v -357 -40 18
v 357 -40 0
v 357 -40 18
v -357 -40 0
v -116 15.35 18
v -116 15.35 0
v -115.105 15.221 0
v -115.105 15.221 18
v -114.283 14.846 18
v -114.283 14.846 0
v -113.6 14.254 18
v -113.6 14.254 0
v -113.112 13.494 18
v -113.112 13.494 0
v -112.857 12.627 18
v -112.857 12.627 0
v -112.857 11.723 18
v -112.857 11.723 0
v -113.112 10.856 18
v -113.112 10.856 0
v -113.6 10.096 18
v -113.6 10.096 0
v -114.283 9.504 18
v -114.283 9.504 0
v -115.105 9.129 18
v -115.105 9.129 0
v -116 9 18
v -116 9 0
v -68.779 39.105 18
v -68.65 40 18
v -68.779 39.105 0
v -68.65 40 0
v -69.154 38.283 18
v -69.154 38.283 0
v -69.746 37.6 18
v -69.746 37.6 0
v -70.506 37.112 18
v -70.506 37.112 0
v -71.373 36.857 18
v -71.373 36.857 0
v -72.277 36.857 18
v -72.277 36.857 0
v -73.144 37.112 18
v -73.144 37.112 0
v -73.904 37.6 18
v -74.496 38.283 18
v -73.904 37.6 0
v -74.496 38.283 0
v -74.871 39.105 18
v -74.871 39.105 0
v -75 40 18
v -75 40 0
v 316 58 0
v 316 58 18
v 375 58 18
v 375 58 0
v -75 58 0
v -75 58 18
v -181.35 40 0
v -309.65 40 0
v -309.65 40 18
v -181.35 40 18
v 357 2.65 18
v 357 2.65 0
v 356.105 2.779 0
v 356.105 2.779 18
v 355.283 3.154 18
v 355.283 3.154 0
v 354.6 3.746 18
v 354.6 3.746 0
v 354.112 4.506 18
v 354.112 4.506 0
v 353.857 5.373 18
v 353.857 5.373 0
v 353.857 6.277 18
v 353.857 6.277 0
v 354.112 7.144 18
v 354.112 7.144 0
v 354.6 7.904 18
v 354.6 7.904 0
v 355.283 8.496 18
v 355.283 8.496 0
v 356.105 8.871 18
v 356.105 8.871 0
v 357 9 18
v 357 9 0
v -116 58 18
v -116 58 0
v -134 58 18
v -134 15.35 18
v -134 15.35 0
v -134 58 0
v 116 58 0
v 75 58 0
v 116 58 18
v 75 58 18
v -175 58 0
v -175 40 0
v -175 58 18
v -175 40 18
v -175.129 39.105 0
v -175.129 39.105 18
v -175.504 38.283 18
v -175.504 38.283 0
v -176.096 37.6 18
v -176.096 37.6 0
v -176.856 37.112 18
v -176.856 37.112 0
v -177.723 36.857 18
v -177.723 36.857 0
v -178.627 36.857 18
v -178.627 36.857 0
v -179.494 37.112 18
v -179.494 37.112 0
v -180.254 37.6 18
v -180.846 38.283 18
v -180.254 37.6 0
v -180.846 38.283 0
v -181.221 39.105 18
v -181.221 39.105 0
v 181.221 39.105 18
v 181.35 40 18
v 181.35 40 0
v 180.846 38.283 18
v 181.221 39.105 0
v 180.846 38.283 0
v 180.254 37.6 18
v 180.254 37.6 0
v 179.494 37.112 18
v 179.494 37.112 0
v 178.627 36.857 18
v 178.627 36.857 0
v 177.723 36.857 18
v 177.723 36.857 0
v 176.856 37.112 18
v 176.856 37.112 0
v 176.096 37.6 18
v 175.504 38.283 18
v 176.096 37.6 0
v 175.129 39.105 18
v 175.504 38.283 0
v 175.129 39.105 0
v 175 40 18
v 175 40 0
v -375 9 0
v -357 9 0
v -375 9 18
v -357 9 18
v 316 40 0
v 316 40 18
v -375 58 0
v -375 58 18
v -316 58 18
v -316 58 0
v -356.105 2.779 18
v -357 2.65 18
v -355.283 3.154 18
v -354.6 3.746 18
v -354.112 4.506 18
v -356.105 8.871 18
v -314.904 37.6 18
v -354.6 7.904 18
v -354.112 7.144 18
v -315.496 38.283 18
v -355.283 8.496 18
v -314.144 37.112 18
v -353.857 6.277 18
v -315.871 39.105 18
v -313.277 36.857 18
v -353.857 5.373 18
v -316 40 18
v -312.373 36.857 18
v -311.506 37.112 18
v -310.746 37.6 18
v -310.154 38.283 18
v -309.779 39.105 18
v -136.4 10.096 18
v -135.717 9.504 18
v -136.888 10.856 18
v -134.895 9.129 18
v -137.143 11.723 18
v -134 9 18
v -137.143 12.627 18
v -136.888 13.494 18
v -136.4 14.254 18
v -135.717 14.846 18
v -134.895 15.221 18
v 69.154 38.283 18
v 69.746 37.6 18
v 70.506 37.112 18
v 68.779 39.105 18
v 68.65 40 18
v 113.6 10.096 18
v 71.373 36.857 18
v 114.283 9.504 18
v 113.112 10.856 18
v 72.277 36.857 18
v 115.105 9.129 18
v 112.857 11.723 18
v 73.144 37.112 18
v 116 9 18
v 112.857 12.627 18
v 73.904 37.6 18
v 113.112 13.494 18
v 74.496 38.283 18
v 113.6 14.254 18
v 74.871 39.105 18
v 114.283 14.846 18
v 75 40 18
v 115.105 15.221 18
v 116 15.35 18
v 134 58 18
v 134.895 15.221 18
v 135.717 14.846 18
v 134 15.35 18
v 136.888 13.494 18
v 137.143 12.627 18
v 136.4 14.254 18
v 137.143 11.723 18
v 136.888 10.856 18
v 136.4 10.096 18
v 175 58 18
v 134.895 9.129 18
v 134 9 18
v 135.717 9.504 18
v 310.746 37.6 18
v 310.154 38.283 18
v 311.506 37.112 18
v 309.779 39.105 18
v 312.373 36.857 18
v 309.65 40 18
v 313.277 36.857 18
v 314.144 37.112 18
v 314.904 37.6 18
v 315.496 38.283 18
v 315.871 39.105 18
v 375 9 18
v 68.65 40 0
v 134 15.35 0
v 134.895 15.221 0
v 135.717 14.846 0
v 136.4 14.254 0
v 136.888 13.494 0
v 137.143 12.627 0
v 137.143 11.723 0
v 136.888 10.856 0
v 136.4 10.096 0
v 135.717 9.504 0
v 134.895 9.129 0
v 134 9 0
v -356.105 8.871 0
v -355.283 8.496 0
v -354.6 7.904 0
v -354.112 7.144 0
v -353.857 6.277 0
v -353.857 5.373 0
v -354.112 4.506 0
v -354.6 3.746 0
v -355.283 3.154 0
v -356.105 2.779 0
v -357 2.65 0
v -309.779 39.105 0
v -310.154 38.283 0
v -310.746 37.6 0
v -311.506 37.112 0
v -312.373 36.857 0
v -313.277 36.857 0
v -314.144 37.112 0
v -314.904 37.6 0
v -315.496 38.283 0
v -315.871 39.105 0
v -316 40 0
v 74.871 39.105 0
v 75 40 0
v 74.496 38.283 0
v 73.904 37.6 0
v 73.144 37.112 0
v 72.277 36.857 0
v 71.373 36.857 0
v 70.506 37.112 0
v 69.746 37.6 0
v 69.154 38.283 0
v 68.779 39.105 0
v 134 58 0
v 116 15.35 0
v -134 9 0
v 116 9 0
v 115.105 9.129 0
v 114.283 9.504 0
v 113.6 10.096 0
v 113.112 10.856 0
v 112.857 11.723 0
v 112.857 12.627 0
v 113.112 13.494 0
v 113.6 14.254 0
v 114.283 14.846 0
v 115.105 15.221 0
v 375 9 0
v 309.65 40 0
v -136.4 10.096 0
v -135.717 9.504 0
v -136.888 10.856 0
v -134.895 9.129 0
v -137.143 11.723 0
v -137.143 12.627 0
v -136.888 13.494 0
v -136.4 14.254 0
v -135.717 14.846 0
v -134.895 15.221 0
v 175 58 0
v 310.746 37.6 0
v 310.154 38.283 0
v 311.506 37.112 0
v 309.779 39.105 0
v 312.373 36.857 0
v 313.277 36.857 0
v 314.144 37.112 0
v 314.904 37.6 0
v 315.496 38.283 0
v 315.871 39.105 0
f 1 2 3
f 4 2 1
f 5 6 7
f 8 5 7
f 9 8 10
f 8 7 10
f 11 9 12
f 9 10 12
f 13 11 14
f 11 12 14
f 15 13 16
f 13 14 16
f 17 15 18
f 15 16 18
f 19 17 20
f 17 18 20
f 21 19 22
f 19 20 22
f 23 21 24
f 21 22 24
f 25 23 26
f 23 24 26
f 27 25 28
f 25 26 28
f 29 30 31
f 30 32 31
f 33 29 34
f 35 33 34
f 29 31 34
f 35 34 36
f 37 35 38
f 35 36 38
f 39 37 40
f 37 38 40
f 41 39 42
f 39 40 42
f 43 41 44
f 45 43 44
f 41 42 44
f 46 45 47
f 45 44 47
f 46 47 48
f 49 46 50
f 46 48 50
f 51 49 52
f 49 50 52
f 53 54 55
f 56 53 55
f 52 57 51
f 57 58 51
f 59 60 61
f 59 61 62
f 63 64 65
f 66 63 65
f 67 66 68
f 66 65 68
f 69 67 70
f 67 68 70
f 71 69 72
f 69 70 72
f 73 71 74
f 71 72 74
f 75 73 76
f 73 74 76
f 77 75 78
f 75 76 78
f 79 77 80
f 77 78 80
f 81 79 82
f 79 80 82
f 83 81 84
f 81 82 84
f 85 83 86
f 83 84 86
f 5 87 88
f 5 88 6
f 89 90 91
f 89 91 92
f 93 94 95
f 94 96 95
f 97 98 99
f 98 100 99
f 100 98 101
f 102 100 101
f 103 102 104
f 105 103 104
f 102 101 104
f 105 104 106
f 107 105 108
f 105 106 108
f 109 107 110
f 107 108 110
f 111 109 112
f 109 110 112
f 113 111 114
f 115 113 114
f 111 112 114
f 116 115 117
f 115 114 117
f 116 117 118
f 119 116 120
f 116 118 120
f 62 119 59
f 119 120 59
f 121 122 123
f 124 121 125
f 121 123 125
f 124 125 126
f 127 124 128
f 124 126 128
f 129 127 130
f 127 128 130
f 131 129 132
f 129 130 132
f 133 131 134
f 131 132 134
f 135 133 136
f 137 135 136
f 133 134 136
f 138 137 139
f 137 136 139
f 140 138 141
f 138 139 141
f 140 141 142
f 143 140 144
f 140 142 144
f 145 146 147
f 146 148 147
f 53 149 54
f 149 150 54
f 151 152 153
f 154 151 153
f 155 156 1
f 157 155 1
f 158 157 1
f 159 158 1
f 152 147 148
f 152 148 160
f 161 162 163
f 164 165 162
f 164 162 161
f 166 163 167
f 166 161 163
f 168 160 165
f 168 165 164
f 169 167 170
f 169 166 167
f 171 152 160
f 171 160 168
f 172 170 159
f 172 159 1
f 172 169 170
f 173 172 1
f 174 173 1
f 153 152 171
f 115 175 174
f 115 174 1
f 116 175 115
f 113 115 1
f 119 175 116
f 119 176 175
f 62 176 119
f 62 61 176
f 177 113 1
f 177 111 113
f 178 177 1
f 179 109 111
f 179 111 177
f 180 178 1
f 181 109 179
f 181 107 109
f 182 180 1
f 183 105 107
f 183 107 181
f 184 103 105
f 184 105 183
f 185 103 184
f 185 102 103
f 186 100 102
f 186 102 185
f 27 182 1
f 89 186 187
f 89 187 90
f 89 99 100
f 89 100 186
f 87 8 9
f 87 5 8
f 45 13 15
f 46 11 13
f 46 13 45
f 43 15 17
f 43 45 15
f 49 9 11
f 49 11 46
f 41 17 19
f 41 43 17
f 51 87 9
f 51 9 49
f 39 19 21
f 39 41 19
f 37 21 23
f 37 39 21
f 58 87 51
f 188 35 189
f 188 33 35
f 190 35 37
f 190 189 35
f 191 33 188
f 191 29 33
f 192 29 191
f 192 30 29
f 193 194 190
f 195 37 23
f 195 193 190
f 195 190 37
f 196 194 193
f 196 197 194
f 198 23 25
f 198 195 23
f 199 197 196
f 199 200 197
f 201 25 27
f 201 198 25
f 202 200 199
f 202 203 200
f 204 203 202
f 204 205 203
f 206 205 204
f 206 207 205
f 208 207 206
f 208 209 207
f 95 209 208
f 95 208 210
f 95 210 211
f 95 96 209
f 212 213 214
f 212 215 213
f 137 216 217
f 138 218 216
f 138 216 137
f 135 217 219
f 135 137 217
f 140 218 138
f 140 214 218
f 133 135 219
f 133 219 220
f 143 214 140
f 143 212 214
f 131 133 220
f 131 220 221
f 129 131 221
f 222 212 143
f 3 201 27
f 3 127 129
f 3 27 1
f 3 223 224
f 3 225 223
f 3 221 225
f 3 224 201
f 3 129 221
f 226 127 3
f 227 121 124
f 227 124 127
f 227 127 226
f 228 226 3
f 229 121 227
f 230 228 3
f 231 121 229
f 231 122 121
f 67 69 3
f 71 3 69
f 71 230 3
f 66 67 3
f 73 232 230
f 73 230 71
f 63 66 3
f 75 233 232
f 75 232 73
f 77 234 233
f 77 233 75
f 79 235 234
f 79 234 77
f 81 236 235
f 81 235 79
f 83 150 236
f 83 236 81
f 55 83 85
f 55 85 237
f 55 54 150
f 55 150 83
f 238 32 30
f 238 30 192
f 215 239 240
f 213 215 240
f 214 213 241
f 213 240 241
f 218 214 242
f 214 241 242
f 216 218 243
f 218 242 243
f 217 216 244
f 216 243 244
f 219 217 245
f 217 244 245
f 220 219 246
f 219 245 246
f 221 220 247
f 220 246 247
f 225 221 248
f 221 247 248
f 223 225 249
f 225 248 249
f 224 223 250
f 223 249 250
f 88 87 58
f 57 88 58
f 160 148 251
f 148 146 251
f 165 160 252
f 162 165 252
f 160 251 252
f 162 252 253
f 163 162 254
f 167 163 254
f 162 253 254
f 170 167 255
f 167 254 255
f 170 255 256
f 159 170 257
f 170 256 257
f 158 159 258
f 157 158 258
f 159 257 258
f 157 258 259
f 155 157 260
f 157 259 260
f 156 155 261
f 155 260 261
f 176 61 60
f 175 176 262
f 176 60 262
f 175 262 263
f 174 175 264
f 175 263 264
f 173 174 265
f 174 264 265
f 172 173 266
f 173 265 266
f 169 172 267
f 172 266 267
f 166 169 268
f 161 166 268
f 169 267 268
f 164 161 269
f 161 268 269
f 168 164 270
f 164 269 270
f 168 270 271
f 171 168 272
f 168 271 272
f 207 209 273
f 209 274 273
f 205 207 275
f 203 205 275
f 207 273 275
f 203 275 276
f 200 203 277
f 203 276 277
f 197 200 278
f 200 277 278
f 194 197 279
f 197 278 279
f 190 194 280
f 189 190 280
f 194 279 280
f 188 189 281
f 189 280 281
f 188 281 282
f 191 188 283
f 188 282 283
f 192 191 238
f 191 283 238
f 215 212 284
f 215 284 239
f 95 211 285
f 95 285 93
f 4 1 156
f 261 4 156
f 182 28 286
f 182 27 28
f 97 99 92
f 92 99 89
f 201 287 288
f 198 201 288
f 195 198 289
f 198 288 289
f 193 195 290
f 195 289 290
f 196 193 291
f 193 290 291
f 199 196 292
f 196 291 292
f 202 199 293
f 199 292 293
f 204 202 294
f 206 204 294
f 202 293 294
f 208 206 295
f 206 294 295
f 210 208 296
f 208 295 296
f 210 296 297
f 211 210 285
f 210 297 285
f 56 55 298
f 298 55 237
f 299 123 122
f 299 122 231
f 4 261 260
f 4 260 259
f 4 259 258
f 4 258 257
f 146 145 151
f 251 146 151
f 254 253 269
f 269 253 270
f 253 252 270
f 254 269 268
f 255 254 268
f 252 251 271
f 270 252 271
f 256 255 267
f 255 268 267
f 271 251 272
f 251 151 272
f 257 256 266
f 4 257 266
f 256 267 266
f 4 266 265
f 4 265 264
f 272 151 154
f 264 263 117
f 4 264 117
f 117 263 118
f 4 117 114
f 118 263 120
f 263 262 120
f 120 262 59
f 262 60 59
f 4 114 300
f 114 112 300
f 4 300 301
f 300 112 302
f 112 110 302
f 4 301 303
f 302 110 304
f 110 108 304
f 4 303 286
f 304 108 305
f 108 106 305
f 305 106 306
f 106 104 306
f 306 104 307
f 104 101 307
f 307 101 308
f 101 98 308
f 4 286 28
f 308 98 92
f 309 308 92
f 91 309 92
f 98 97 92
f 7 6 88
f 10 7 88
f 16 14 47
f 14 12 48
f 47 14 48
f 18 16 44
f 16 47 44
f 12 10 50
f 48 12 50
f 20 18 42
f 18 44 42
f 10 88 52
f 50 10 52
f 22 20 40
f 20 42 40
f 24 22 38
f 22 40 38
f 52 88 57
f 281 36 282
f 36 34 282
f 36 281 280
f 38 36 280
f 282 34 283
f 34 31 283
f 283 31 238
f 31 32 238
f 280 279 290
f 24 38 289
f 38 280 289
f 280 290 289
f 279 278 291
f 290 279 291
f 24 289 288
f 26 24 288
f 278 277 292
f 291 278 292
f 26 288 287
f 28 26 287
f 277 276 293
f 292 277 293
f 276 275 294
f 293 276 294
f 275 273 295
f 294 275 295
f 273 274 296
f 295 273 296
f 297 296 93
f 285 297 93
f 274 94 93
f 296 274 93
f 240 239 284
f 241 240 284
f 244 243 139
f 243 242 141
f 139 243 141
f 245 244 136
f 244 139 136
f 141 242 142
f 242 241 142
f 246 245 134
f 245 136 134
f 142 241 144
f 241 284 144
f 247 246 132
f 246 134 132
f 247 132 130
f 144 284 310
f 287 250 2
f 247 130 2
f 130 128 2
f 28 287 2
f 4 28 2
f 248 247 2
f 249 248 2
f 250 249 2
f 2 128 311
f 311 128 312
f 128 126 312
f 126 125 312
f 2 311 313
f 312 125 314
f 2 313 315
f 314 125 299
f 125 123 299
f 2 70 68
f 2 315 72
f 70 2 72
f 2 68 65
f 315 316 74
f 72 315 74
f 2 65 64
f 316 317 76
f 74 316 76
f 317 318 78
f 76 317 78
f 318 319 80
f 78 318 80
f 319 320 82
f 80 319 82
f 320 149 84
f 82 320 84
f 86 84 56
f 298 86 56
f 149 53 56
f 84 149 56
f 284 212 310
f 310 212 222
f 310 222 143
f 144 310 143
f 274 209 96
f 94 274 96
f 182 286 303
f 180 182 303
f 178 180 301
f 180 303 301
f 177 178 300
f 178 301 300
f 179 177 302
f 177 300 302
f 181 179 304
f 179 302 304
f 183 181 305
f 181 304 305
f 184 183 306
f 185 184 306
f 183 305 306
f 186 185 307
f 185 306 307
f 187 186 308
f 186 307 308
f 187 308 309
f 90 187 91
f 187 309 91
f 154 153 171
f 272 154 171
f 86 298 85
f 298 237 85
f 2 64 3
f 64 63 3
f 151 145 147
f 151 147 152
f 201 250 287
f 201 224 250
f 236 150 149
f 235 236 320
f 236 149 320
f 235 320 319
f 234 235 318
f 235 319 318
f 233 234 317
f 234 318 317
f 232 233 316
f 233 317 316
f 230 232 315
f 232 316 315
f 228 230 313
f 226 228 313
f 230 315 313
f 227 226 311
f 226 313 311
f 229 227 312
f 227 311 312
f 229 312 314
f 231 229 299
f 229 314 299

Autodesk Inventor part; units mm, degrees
ref_plane "YZ Plane" through (0, 0, 0) normal (1, 0, 0) x (0, 1, 0)
sketch "Sketch1" plane through (0, 0, 0) normal (0, 0, 1) x (1, 0, 0)
  line L0 (-375, 40) -> (375, 40)
  line L1 (375, 40) -> (375, -40)
  line L2 (375, -40) -> (-375, -40)
  line L3 (-375, -40) -> (-375, 40)
  point P0 (0, 0)
  point P1 (375, 0)
  point P2 (0, 40)
  dimension "d0" = 750
  dimension "d1" = 80
extrude "Extrusion1" add sketch "Sketch1" along normal blind 18
sketch "Sketch2" plane through (0, 0, 18) normal (0, 0, 1) x (1, 0, 0)
  line L0 (375, 40) -> (-375, 40) projected
  line L1 (-375, 40) -> (-375, -40) projected
  line L2 (-375, -40) -> (375, -40) projected
  line L3 (375, -40) -> (375, 40) projected
  line L4 (-375, 58) -> (-316, 58)
  line L5 (-316, 58) -> (-316, 40)
  line L6 (-316, 40) -> (-375, 40)
  line L7 (-375, 40) -> (-375, 58)
  point P0 (0, 0)
  point P1 (-345.5, 40)
  point P2 (0, 40)
  point P3 (-375, 49)
  point P4 (-375, 0)
  dimension "d4" = 18
  dimension "d5" = 59
extrude "Extrusion2" add sketch "Sketch2" against normal blind 18 contours L0 L7 L4 L5
sketch "Sketch3" plane through (0, 0, 18) normal (0, 0, 1) x (1, 0, 0)
  line L0 (-175, 58) -> (-75, 58)
  line L1 (-75, 58) -> (-75, 40)
  line L2 (-75, 40) -> (-175, 40)
  line L3 (-175, 40) -> (-175, 58)
  line L4 (375, 40) -> (-316, 40) projected
  line L5 (-316, 58) -> (-316, 40) projected
  line L6 (-375, 58) -> (-316, 58) projected
  line L7 (-375, -40) -> (-375, 58) projected
  line L8 (-375, -40) -> (375, -40) projected
  line L9 (375, -40) -> (375, 40) projected
  point P0 (0, 0)
  point P1 (-125, 40)
  point P2 (29.5, 40)
  dimension "d8" = 100
  dimension "d9" = 18
  dimension "d10" = 250
extrude "Extrusion3" add sketch "Sketch3" against normal blind 18 contours L0 L1 L2 L3
sketch "Sketch4" plane through (0, 0, 18) normal (0, 0, 1) x (1, 0, 0)
  line L0 (375, 40) -> (-75, 40) projected
  line L1 (-75, 58) -> (-75, 40) projected
  line L2 (-175, 58) -> (-75, 58) projected
  line L3 (-175, 40) -> (-175, 58) projected
  line L4 (-175, 40) -> (-316, 40) projected
  line L5 (-316, 58) -> (-316, 40) projected
  line L6 (-375, 58) -> (-316, 58) projected
  line L7 (-375, -40) -> (-375, 58) projected
  line L8 (-375, -40) -> (375, -40) projected
  line L9 (375, -40) -> (375, 40) projected
  line L10 (-375, -40) -> (-357, -40)
  line L11 (-357, -40) -> (-357, 9)
  line L12 (-357, 9) -> (-375, 9)
  line L13 (-375, 9) -> (-375, -40)
  point P0 (0, 0)
  point P1 (-366, -40)
  point P2 (0, -40)
  point P3 (-375, -15.5)
  point P4 (-375, 9)
  dimension "d13" = 18
  dimension "d14" = 49
extrude "Extrusion4" cut sketch "Sketch4" against normal blind 18 contours L8 L7 L12 L11
sketch "Sketch5" plane through (0, 0, 18) normal (0, 0, 1) x (1, 0, 0)
  line L0 (-134, 58) -> (-116, 58)
  line L1 (-116, 58) -> (-116, 9)
  line L2 (-116, 9) -> (-134, 9)
  line L3 (-134, 9) -> (-134, 58)
  line L4 (-375, 9) -> (-357, 9) projected
  line L5 (-357, 9) -> (-357, -40) projected
  line L6 (-357, -40) -> (375, -40) projected
  line L7 (375, -40) -> (375, 40) projected
  line L8 (375, 40) -> (-75, 40) projected
  line L9 (-75, 58) -> (-75, 40) projected
  line L10 (-175, 58) -> (-75, 58) projected
  line L11 (-175, 40) -> (-175, 58) projected
  line L12 (-175, 40) -> (-316, 40) projected
  line L13 (-316, 58) -> (-316, 40) projected
  line L14 (-375, 58) -> (-316, 58) projected
  line L15 (-375, 9) -> (-375, 58) projected
  line L16 (-175, 58) -> (-75, 58) projected
  point P0 (0, 0)
  point P1 (-125, 58)
  point P2 (-125, 58)
  point P3 (-125, 58)
  dimension "d17" = 18
  dimension "d18" = 49
extrude "Extrusion5" cut sketch "Sketch5" against normal blind 18 contours L0 L1 L2 L3
ref_plane "Work Plane1" through (0, 58, 0) normal (-1, 0, 0) x (0, 0, 1)
mirror "Mirror1" about plane through (0, 58, 0) normal (-1, 0, 0) of "Extrusion5", "Extrusion4", "Extrusion3", "Extrusion2"
sketch "Sketch6" plane through (0, 0, 18) normal (0, 0, 1) x (1, 0, 0)
  line L0 (357, 9) -> (375, 9) projected
  line L1 (375, 9) -> (375, 58) projected
  line L2 (375, 58) -> (316, 58) projected
  line L3 (316, 58) -> (316, 40) projected
  line L4 (316, 40) -> (175, 40) projected
  line L5 (175, 40) -> (175, 58) projected
  line L6 (175, 58) -> (134, 58) projected
  line L7 (134, 58) -> (134, 9) projected
  line L8 (134, 9) -> (116, 9) projected
  line L9 (116, 9) -> (116, 58) projected
  line L10 (116, 58) -> (75, 58) projected
  line L11 (75, 58) -> (75, 40) projected
  line L12 (75, 40) -> (-75, 40) projected
  line L13 (-75, 58) -> (-75, 40) projected
  line L14 (-116, 58) -> (-75, 58) projected
  line L15 (-116, 58) -> (-116, 9) projected
  line L16 (-116, 9) -> (-134, 9) projected
  line L17 (-134, 9) -> (-134, 58) projected
  line L18 (-175, 58) -> (-134, 58) projected
  line L19 (-175, 40) -> (-175, 58) projected
  line L20 (-175, 40) -> (-316, 40) projected
  line L21 (-316, 58) -> (-316, 40) projected
  line L22 (-375, 58) -> (-316, 58) projected
  line L23 (-375, 9) -> (-375, 58) projected
  line L24 (-375, 9) -> (-357, 9) projected
  line L25 (-357, 9) -> (-357, -40) projected
  line L26 (-357, -40) -> (357, -40) projected
  line L27 (357, -40) -> (357, 9) projected
  point P0 (0, 0)
  point P1 (-357, 5.825)
  point P2 (-312.825, 40)
  dimension "d21" = 3.175
  dimension "d22" = 3.175
hole "Hole1" at (-357, 5.825, 18) at (-312.825, 40, 18) direction (0, 0, -1) diameter 6.35 end through all
mirror "Mirror2" about plane through (0, 58, 0) normal (-1, 0, 0) of "Hole1"
sketch "Sketch7" plane through (0, 0, 18) normal (0, 0, 1) x (1, 0, 0)
  arc A0 (357, 9) -> (357, 2.65) centre (357, 5.825) ccw projected
  line L0 (357, 9) -> (375, 9) projected
  line L1 (375, 9) -> (375, 58) projected
  line L2 (375, 58) -> (316, 58) projected
  line L3 (316, 58) -> (316, 40) projected
  arc A1 (309.65, 40) -> (316, 40) centre (312.825, 40) ccw projected
  line L4 (309.65, 40) -> (175, 40) projected
  line L5 (175, 40) -> (175, 58) projected
  line L6 (175, 58) -> (134, 58) projected
  line L7 (134, 58) -> (134, 9) projected
  line L8 (134, 9) -> (116, 9) projected
  line L9 (116, 9) -> (116, 58) projected
  line L10 (116, 58) -> (75, 58) projected
  line L11 (75, 58) -> (75, 40) projected
  line L12 (75, 40) -> (-75, 40) projected
  line L13 (-75, 58) -> (-75, 40) projected
  line L14 (-116, 58) -> (-75, 58) projected
  line L15 (-116, 58) -> (-116, 9) projected
  line L16 (-116, 9) -> (-134, 9) projected
  line L17 (-134, 9) -> (-134, 58) projected
  line L18 (-175, 58) -> (-134, 58) projected
  line L19 (-175, 40) -> (-175, 58) projected
  line L20 (-175, 40) -> (-309.65, 40) projected
  arc A2 (-316, 40) -> (-309.65, 40) centre (-312.825, 40) ccw projected
  line L21 (-316, 58) -> (-316, 40) projected
  line L22 (-375, 58) -> (-316, 58) projected
  line L23 (-375, 9) -> (-375, 58) projected
  line L24 (-375, 9) -> (-357, 9) projected
  arc A3 (-357, 2.65) -> (-357, 9) centre (-357, 5.825) ccw projected
  line L25 (-357, 2.65) -> (-357, -40) projected
  line L26 (-357, -40) -> (357, -40) projected
  line L27 (357, -40) -> (357, 2.65) projected
  point P0 (0, 0)
  point P1 (-178.175, 40)
  point P2 (-134, 12.175)
  point P3 (-242.325, 40)
  dimension "d30" = 3.175
  dimension "d31" = 3.175
hole "Hole2" at (-178.175, 40, 18) at (-134, 12.175, 18) direction (0, 0, -1) diameter 6.35 end through all
ref_plane "Work Plane2" through (-125, 58, 18) normal (1, 0, 0) x (0, 0, -1)
mirror "Mirror3" about plane through (-125, 58, 18) normal (1, 0, 0) of "Hole2"
mirror "Mirror4" about plane through (0, 58, 0) normal (-1, 0, 0) of "Hole2", "Mirror3"
equation "\"d0\" = tableWidth"
equation "\"d1\" = legTopDepth"
equation "\"d2\" = plyThickness"
equation "\"d4\" = legTopTabHeight"
equation "\"d5\" = 0.5 * plyThickness + 0.5 * legTabTotalWidth"
equation "\"d6\" = plyThickness"
equation "\"d8\" = legTabTotalWidth"
equation "\"d9\" = legTopTabHeight"
equation "\"d10\" = 0.333333 * tableWidth"
equation "\"d11\" = plyThickness"
equation "\"d13\" = plyThickness"
equation "\"d14\" = legTopSlotDepth"
equation "\"d15\" = plyThickness"
equation "\"d17\" = plyThickness"
equation "\"d18\" = legTopSlotDepth"
equation "\"d19\" = plyThickness"
equation "\"d21\" = 0.5 * millDiameter"
equation "\"d22\" = 0.5 * millDiameter"
equation "\"d23\" = millDiameter"
equation "\"d30\" = 0.5 * millDiameter"
equation "\"d31\" = 0.5 * millDiameter"
equation "\"d32\" = millDiameter"
equation "\"plyThickness\" = 18"
equation "\"legHeight\" = 702"
equation "\"tableWidth\" = 750"
equation "\"legTopDepth\" = 80"
equation "\"millDiameter\" = 6.35"
equation "\"legTopTabHeight\" = 18"
equation "\"legTabTotalWidth\" = 100"
equation "\"legTopSlotDepth\" = 49"
properties part number "shortSlat"
